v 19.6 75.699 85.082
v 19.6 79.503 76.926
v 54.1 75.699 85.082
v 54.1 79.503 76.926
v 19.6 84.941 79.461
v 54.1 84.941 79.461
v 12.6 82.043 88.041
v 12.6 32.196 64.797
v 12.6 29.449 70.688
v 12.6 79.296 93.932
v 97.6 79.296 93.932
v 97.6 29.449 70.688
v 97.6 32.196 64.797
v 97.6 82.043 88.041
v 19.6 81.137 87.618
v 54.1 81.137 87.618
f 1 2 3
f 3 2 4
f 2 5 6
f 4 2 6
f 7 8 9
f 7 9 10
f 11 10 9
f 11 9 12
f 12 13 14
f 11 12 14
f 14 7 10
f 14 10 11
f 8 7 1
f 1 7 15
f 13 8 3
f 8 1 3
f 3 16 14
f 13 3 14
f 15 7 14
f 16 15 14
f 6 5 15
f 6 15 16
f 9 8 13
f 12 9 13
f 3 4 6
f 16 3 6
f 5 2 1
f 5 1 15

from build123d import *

# Parameters (mm, degrees)
BOX005_W                  = 34.5
BOX005_H                  = 6
BOX005_DEPTH              = 9
BOX004_W                  = 85
BOX004_H                  = 55
BOX004_DEPTH              = 6.5
FUSION001_PLACEMENT_ANGLE = 25


with BuildPart() as cube010:
    # Box005 → Box005 (new body)
    with BuildSketch(Plane(origin=(7, 48, 0), x_dir=(1, 0, 0), z_dir=(0, 0, 1))):
        with Locations((17.25, 3)):
            Rectangle(BOX005_W, BOX005_H)
    extrude(amount=BOX005_DEPTH)


with BuildPart() as touchscreen:
    # Box004 → Box004 (new body)
    with BuildSketch(Plane.XY.offset(9)):
        with Locations((42.5, 27.5)):
            Rectangle(BOX004_W, BOX004_H)
    extrude(amount=BOX004_DEPTH)

    # Fusion001: union Cube010
    add(cube010.part)


with BuildPart() as touchscreen_1:
    # Fusion001 placement: moved
    add(touchscreen.part.moved(Location((12.6, 36, 56.64))).rotate(Axis((12.6, 36, 56.64), (1, 0, 0)), FUSION001_PLACEMENT_ANGLE))


solid = touchscreen_1.part
